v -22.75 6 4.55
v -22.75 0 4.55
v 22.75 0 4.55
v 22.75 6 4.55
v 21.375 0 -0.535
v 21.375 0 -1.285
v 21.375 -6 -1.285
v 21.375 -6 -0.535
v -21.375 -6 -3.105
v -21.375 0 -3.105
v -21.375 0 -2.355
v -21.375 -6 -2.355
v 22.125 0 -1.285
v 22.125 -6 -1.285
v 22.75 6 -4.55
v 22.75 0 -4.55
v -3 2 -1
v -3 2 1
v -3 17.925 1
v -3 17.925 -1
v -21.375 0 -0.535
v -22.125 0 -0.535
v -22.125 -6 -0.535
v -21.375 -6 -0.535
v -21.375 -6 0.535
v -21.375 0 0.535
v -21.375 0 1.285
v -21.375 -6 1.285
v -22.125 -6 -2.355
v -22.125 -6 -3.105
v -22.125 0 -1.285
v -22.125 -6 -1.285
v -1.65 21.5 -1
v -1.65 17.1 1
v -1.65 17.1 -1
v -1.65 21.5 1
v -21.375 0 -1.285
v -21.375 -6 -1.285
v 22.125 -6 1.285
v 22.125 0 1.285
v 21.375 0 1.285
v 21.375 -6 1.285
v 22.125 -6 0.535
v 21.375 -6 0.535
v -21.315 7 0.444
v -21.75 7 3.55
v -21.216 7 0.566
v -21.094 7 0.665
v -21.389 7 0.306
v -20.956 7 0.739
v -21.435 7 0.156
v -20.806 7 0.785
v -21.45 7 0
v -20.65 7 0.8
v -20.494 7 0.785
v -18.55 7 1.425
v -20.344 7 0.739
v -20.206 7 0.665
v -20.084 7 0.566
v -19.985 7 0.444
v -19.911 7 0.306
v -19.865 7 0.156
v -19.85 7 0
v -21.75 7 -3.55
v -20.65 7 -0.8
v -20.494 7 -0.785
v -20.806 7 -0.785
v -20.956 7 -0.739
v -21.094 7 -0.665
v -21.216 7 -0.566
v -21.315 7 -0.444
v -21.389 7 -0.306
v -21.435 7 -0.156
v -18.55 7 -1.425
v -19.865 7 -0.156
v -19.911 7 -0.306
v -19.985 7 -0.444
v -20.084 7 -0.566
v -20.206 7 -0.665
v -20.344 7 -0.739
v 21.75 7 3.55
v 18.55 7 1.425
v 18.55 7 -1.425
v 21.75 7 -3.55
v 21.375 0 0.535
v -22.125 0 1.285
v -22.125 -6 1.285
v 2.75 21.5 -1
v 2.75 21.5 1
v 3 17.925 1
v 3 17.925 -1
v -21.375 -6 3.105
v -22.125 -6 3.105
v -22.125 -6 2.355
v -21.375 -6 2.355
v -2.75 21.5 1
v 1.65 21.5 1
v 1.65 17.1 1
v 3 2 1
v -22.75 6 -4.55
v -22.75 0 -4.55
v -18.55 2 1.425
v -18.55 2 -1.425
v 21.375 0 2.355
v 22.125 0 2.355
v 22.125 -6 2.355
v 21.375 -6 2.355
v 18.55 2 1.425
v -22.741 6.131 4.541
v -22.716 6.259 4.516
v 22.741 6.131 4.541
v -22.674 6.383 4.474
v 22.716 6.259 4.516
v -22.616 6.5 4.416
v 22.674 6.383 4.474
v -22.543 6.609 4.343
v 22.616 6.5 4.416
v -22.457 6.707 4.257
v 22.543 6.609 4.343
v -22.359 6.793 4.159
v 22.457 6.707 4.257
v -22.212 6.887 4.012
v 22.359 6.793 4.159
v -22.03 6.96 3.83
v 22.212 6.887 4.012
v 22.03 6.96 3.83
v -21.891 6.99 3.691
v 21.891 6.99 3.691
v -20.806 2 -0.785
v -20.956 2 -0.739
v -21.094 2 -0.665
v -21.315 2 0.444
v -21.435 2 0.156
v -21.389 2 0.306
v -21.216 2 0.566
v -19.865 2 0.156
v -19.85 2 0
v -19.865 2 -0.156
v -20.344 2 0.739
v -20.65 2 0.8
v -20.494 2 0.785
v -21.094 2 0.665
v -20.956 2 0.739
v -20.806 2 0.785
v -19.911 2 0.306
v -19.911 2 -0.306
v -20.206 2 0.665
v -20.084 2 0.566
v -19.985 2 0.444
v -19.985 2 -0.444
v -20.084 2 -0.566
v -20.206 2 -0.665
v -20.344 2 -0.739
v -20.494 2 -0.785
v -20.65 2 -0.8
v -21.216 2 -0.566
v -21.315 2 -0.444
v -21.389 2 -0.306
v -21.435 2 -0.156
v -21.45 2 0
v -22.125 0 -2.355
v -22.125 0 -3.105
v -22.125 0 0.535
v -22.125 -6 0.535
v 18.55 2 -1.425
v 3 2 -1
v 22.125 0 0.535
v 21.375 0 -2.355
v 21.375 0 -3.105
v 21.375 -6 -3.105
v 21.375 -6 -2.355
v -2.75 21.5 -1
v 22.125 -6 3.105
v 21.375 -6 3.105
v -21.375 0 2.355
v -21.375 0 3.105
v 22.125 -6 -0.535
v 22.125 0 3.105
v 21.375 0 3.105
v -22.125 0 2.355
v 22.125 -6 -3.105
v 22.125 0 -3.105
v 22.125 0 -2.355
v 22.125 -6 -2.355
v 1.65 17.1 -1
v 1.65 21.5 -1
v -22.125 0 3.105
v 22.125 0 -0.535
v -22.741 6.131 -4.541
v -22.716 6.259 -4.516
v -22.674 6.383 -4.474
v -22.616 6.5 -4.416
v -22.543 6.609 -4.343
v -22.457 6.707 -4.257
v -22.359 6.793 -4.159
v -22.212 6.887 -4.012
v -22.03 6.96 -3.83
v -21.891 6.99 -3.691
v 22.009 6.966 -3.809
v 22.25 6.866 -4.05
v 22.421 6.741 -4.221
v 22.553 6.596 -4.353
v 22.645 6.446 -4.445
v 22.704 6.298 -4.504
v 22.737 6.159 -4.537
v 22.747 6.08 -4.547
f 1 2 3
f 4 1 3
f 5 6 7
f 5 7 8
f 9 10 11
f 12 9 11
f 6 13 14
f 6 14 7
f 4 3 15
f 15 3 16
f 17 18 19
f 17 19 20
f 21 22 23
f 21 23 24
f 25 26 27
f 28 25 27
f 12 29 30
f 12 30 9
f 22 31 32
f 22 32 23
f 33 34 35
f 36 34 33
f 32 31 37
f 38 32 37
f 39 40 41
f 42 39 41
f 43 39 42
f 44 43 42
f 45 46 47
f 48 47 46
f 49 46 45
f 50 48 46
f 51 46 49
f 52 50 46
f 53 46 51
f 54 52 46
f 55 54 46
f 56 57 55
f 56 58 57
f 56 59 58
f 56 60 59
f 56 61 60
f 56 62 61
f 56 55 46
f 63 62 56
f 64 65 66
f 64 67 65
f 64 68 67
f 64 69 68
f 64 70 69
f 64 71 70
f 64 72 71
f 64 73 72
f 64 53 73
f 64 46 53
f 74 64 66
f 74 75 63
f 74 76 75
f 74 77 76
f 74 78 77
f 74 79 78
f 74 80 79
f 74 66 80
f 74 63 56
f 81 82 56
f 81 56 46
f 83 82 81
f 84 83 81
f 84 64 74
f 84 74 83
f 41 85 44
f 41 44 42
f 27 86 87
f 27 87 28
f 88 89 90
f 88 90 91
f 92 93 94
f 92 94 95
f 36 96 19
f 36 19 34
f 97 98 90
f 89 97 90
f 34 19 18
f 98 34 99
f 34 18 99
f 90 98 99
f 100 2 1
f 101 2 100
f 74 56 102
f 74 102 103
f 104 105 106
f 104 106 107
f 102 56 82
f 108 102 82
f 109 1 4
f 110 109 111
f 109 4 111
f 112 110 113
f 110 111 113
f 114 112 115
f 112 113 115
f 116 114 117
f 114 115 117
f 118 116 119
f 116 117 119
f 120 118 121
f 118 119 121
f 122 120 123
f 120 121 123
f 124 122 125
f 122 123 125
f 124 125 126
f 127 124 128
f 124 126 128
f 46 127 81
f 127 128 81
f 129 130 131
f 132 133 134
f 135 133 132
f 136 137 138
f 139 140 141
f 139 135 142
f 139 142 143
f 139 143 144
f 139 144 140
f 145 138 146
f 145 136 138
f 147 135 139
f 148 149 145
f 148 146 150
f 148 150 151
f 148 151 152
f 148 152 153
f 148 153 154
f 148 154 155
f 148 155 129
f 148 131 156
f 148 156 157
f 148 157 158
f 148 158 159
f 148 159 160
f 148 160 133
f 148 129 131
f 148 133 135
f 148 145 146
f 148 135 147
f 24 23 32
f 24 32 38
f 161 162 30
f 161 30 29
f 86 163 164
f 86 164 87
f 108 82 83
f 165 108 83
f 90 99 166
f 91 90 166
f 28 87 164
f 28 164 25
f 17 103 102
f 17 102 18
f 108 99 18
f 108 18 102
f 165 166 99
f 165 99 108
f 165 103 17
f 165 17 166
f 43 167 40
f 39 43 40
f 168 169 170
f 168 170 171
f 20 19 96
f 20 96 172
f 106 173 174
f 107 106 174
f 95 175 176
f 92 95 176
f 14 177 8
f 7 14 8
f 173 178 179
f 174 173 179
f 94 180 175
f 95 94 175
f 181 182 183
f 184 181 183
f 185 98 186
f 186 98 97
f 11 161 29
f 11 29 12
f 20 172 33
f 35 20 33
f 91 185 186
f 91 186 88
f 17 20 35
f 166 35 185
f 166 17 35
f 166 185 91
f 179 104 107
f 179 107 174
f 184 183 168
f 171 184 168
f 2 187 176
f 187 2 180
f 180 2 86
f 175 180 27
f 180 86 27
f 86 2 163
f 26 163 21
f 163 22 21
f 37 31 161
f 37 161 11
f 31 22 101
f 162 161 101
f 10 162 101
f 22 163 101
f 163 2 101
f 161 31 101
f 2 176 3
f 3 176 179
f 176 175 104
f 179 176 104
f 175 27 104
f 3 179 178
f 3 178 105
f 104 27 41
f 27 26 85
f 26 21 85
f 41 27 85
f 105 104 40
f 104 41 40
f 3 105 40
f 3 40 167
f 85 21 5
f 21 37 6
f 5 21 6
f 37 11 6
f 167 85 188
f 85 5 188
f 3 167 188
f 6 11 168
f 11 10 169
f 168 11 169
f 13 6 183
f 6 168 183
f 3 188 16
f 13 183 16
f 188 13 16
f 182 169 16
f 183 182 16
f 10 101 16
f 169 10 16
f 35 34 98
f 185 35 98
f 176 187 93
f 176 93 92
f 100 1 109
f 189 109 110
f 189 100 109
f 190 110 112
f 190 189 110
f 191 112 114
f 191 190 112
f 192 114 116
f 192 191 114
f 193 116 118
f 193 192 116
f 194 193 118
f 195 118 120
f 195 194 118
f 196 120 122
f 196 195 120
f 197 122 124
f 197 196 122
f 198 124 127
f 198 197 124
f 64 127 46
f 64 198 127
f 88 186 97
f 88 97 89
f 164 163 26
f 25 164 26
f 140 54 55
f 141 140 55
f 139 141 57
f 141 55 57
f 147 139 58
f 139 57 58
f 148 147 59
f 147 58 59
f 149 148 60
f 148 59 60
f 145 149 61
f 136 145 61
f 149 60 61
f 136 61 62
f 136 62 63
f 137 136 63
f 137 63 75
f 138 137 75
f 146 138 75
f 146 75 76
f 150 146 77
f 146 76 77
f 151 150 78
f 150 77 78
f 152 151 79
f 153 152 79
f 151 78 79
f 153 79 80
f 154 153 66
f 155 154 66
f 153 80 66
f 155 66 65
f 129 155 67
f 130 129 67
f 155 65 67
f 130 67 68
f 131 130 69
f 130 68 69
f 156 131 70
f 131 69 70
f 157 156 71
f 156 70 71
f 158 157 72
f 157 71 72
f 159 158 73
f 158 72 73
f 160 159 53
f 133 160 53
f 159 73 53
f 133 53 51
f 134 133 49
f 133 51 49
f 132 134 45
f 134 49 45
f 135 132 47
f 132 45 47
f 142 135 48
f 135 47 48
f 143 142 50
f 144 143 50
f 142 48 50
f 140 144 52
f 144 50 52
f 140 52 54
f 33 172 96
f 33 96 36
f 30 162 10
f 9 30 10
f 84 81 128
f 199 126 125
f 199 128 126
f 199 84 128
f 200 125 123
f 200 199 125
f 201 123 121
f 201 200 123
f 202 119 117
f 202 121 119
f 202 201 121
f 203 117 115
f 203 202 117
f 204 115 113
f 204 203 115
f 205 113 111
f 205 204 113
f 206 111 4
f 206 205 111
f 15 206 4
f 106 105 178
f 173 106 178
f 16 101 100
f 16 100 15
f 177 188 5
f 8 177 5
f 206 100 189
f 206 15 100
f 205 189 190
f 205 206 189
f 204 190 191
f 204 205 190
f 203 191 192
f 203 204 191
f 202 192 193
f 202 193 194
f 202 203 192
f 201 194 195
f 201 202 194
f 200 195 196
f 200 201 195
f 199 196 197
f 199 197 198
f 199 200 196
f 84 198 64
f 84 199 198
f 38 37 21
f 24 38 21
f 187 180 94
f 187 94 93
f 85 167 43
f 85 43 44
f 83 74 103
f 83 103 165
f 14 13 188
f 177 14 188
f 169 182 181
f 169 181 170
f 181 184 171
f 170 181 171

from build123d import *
from OCP.BRepFilletAPI import BRepFilletAPI_MakeChamfer

# Parameters (mm, degrees)
SKETCH1_W           = 45.5
SKETCH1_H           = 9.1
BOSS_EXTRUDE1_DEPTH = 7
SKETCH2_W           = 37.1
SKETCH2_H           = 2.85
CUT_EXTRUDE1_DEPTH  = 5
SKETCH3_R           = 0.8
CUT_EXTRUDE2_DEPTH  = 5
FILLET1_R           = 1
SKETCH4_W           = 0.75
SKETCH4_H           = 0.75
BOSS_EXTRUDE2_DEPTH = 6
SKETCH5_W           = 6
SKETCH5_H           = 2
BOSS_EXTRUDE3_DEPTH = 19.5
CUT_EXTRUDE3_REACH  = 33.79
SKETCH6_W           = 3.3
SKETCH6_H           = 4.4
CHAMFER1_SIZE       = 0.25
CHAMFER1_SIZE2      = 3.575166564


with BuildPart() as part:
    # Sketch1 → Boss-Extrude1 (new body)
    with BuildSketch(Plane(origin=(0, 0, 0), x_dir=(1, 0, 0), z_dir=(0, 1, 0))):
        Rectangle(SKETCH1_W, SKETCH1_H)
    extrude(amount=BOSS_EXTRUDE1_DEPTH)

    # Sketch2 → Cut-Extrude1 (cut)
    with BuildSketch(Plane(origin=(0, 7, 0), x_dir=(1, 0, 0), z_dir=(0, 1, 0))):
        Rectangle(SKETCH2_W, SKETCH2_H)
    extrude(amount=-CUT_EXTRUDE1_DEPTH, mode=Mode.SUBTRACT)

    # Sketch3 → Cut-Extrude2 (cut)
    with BuildSketch(Plane(origin=(0, 7, 0), x_dir=(1, 0, 0), z_dir=(0, 1, 0))):
        with Locations(Location((-20.65, 0, 0), (0, 0, 270))):
            Circle(SKETCH3_R)
    extrude(amount=-CUT_EXTRUDE2_DEPTH, mode=Mode.SUBTRACT)

    # Fillet1
    fillet1_edges = [part.edges().sort_by_distance(p)[0] for p in [
        (-22.75, 7, 0),
        (0, 7, 4.55),
        (22.75, 7, 0),
        (0, 7, -4.55),
    ]]
    fillet(fillet1_edges, radius=FILLET1_R)

    # Sketch4 → Boss-Extrude2 (add)
    with BuildSketch(Plane.XZ):
        with Locations((-21.75, 2.73)):
            Rectangle(SKETCH4_W, SKETCH4_H)
        with Locations((-21.75, 0.91)):
            Rectangle(SKETCH4_W, SKETCH4_H)
        with Locations((-21.75, -0.91)):
            Rectangle(SKETCH4_W, SKETCH4_H)
        with Locations((-21.75, -2.73)):
            Rectangle(SKETCH4_W, SKETCH4_H)
    boss_extrude2 = extrude(amount=BOSS_EXTRUDE2_DEPTH)

    # Mirror1: Boss-Extrude2 across plane
    add(boss_extrude2.mirror(Plane(origin=(0, 0, 0), x_dir=(0, 0, 1), z_dir=(1, 0, 0))))

    # Sketch5 → Boss-Extrude3 (add)
    with BuildSketch(Plane(origin=(0, 2, 0), x_dir=(1, 0, 0), z_dir=(0, 1, 0))):
        Rectangle(SKETCH5_W, SKETCH5_H)
    extrude(amount=BOSS_EXTRUDE3_DEPTH)

    # Sketch6 → Cut-Extrude3 (cut, up to next)
    with BuildSketch(Plane.XY.offset(1), mode=Mode.PRIVATE) as cut_extrude3_sk1:
        with Locations((0, 19.3)):
            Rectangle(SKETCH6_W, SKETCH6_H)
    cut_extrude3_tool1 = extrude(cut_extrude3_sk1.sketch, amount=-CUT_EXTRUDE3_REACH, mode=Mode.PRIVATE) & part.part
    add(cut_extrude3_tool1.solids().sort_by_distance((0, 19.3, 1))[0], mode=Mode.SUBTRACT)

    # Chamfer1: one chamfer whose edges measure the first distance from different faces: ONE call of the kernel's chamfer builder (chamfer() names one face for all edges)
    chamfer1_edges_1 = [part.edges().sort_by_distance(p)[0] for p in [
        (-3, 21.5, 0),
    ]]
    chamfer1_side_1 = [part.faces().sort_by_distance(p)[0] for p in [
        (-2.325, 21.5, 0),
    ]]
    chamfer1_edges_2 = [part.edges().sort_by_distance(p)[0] for p in [
        (3, 21.5, 0),
    ]]
    chamfer1_side_2 = [part.faces().sort_by_distance(p)[0] for p in [
        (2.325, 21.5, 0),
    ]]
    chamfer1 = BRepFilletAPI_MakeChamfer(part.part.solid().wrapped)
    for e in chamfer1_edges_1:
        chamfer1.Add(CHAMFER1_SIZE, CHAMFER1_SIZE2, e.wrapped, chamfer1_side_1[0].wrapped)  # the first distance lies on this face
    for e in chamfer1_edges_2:
        chamfer1.Add(CHAMFER1_SIZE, CHAMFER1_SIZE2, e.wrapped, chamfer1_side_2[0].wrapped)  # the first distance lies on this face
    add(Compound.cast(chamfer1.Shape()), mode=Mode.REPLACE)


solid = part.part
